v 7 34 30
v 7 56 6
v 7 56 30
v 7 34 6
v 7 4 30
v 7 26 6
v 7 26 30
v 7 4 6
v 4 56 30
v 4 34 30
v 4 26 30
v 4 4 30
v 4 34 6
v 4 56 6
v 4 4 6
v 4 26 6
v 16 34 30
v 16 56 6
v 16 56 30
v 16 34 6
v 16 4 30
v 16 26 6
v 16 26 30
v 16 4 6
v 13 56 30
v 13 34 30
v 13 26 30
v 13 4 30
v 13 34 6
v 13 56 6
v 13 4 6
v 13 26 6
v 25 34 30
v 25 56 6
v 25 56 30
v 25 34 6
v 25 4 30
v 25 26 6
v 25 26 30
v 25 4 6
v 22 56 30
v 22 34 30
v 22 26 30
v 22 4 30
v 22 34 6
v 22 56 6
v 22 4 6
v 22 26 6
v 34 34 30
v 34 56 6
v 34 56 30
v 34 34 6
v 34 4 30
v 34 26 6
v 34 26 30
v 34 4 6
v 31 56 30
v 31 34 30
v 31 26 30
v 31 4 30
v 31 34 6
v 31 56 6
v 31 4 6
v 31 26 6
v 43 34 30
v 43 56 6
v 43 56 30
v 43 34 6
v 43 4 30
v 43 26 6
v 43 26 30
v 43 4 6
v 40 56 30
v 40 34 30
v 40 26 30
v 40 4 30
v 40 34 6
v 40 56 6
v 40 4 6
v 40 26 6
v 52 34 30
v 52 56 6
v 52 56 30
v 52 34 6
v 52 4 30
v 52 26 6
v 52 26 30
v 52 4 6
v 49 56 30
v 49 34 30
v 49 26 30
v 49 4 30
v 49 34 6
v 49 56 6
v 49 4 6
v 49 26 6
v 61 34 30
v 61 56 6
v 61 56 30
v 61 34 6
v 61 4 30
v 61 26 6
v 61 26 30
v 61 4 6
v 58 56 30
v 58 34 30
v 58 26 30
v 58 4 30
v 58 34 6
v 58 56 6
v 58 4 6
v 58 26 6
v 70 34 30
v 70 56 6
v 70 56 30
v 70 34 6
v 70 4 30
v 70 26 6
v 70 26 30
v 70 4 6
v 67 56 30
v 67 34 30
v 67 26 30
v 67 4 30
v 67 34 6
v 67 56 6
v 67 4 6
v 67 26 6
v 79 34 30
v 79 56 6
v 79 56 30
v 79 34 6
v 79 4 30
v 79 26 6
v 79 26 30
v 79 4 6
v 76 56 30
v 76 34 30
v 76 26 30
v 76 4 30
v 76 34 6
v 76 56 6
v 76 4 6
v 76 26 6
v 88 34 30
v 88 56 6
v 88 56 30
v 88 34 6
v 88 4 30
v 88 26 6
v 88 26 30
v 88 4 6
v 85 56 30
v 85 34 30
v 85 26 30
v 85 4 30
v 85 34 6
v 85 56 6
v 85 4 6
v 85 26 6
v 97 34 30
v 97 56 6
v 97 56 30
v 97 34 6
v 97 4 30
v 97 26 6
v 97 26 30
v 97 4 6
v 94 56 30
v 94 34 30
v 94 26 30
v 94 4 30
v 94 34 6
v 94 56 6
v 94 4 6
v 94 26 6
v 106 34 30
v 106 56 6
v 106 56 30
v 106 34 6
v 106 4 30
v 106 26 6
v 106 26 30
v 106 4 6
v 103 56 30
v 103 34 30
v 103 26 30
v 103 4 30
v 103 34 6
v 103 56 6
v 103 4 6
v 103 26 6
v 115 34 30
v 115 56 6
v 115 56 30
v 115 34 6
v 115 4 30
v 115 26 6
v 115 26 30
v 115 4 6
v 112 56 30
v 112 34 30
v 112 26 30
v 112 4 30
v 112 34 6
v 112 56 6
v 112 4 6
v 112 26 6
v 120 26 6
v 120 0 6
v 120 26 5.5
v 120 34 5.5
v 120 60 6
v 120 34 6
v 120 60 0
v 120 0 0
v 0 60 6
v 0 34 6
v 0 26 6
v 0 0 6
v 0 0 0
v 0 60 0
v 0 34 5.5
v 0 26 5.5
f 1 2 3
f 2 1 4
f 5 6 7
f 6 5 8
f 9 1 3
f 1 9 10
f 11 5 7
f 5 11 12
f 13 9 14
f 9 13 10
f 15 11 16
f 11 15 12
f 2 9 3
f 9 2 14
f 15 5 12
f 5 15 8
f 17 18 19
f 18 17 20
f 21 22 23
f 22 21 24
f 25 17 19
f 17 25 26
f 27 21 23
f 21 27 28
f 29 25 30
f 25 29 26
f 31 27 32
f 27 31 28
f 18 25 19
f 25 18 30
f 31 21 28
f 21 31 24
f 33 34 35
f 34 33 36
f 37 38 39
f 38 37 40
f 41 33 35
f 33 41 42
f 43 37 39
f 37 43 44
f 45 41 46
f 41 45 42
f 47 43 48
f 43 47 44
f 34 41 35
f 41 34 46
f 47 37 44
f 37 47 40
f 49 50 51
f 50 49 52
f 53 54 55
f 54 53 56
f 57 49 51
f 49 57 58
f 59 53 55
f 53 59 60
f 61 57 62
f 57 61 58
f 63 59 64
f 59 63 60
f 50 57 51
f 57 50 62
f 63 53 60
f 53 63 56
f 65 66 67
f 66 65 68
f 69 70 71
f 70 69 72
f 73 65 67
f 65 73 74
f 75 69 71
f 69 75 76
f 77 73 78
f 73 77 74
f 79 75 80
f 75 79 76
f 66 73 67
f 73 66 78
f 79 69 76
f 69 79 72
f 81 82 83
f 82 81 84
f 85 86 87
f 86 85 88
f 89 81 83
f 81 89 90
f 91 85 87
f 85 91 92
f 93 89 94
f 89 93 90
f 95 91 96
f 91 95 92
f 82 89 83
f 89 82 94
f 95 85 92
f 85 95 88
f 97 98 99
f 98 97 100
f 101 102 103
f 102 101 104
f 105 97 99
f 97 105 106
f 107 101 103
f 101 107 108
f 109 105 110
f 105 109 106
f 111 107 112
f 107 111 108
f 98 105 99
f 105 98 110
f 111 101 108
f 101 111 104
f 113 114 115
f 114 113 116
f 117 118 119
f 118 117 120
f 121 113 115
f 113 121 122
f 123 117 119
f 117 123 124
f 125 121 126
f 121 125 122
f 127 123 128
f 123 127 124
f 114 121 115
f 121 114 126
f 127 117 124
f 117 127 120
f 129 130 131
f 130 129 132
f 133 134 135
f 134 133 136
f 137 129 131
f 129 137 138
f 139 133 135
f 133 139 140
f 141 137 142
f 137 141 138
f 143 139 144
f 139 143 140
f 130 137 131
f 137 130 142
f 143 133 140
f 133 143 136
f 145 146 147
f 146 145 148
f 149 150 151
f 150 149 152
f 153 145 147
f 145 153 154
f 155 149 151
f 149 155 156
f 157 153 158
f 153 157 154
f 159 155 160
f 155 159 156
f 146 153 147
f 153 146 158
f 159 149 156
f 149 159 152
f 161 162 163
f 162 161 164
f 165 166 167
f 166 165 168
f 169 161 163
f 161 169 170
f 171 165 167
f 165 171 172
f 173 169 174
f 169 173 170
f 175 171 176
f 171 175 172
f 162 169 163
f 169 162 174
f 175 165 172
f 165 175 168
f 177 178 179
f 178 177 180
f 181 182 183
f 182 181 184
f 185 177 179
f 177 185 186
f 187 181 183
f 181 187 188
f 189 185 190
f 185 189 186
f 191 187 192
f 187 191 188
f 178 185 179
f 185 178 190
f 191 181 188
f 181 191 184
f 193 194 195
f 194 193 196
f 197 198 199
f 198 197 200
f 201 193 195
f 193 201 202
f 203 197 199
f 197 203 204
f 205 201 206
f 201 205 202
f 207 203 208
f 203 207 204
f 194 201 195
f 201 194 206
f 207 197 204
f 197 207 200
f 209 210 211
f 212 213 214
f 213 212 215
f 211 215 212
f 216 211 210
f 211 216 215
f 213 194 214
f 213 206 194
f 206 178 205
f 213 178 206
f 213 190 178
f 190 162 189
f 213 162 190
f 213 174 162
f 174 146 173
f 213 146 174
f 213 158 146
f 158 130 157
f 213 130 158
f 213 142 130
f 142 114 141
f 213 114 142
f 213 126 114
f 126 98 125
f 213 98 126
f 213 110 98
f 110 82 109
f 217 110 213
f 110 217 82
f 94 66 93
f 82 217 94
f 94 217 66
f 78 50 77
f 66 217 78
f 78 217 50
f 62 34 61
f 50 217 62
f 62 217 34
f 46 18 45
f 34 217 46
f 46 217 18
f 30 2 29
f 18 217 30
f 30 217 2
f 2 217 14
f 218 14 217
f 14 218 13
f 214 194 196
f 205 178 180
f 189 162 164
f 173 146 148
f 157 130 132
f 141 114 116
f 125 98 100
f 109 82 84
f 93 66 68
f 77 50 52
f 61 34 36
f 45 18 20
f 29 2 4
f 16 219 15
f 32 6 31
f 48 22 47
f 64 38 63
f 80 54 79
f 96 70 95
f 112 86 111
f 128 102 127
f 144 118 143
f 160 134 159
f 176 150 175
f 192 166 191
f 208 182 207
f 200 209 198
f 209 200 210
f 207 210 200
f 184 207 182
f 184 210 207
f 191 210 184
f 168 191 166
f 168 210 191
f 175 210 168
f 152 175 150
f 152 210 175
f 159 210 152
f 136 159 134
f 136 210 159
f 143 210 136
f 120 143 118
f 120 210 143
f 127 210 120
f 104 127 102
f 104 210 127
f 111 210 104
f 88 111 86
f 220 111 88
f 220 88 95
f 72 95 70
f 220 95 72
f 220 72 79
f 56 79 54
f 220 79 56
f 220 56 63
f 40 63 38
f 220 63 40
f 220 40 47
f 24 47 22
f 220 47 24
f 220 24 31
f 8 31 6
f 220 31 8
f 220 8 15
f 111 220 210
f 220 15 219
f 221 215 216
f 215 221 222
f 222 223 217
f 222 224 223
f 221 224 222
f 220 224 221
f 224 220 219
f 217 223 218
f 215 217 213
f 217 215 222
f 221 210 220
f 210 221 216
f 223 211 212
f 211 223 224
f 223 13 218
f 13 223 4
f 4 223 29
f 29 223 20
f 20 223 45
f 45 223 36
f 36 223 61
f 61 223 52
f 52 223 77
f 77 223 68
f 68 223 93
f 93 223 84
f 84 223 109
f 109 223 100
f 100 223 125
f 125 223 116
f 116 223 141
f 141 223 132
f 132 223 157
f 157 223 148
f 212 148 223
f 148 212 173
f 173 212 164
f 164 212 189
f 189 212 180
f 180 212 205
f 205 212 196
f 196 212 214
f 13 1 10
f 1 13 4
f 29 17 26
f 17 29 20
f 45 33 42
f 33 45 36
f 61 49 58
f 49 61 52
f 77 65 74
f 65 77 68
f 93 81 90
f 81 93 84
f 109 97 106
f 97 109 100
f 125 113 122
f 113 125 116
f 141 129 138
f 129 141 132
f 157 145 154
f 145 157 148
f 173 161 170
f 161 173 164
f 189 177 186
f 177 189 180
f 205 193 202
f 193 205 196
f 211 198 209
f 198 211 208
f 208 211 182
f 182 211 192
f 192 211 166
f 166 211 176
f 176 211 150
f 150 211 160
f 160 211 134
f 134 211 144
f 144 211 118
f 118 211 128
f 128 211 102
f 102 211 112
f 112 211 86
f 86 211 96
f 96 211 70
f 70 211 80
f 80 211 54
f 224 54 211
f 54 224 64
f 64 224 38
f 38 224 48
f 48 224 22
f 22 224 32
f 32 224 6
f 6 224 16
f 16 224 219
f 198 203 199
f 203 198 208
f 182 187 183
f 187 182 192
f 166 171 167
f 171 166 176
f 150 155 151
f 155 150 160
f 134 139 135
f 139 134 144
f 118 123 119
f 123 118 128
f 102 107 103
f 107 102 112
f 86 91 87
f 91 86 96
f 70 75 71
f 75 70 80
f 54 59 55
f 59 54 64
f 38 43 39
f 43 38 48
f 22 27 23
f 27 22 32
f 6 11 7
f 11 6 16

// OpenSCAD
$fn = 32;

// ----------------------------------------------------------------------
// Heatsink: slotted fin block
// ----------------------------------------------------------------------

// --- parameters (mm) ---
base_l = 120;             // base length, X
base_w = 60;              // base width, Y
base_t = 6;               // base plate thickness
fin_h = 25;               // fin height above the base
fin_t = 3;                // fin thickness
edge = 4;                 // margin from the base ends
pitch = 9;                // fin pitch
slot_w = 8;               // central slot width, Y

n_fins = floor((base_l - 2 * edge - fin_t) / pitch) + 1;  // fin count
total_h = base_t + fin_h - 1;  // overall height

difference() {
union() {
  cube([base_l, base_w, base_t]);
  for (i = [0 : n_fins - 1])
    translate([edge + i * pitch, edge, base_t - 1])
      cube([fin_t, base_w - 2 * edge, fin_h]);
}
  translate([-1, base_w / 2 - slot_w / 2, base_t - 0.5])
    cube([base_l + 2, slot_w, fin_h + 2]);
}
